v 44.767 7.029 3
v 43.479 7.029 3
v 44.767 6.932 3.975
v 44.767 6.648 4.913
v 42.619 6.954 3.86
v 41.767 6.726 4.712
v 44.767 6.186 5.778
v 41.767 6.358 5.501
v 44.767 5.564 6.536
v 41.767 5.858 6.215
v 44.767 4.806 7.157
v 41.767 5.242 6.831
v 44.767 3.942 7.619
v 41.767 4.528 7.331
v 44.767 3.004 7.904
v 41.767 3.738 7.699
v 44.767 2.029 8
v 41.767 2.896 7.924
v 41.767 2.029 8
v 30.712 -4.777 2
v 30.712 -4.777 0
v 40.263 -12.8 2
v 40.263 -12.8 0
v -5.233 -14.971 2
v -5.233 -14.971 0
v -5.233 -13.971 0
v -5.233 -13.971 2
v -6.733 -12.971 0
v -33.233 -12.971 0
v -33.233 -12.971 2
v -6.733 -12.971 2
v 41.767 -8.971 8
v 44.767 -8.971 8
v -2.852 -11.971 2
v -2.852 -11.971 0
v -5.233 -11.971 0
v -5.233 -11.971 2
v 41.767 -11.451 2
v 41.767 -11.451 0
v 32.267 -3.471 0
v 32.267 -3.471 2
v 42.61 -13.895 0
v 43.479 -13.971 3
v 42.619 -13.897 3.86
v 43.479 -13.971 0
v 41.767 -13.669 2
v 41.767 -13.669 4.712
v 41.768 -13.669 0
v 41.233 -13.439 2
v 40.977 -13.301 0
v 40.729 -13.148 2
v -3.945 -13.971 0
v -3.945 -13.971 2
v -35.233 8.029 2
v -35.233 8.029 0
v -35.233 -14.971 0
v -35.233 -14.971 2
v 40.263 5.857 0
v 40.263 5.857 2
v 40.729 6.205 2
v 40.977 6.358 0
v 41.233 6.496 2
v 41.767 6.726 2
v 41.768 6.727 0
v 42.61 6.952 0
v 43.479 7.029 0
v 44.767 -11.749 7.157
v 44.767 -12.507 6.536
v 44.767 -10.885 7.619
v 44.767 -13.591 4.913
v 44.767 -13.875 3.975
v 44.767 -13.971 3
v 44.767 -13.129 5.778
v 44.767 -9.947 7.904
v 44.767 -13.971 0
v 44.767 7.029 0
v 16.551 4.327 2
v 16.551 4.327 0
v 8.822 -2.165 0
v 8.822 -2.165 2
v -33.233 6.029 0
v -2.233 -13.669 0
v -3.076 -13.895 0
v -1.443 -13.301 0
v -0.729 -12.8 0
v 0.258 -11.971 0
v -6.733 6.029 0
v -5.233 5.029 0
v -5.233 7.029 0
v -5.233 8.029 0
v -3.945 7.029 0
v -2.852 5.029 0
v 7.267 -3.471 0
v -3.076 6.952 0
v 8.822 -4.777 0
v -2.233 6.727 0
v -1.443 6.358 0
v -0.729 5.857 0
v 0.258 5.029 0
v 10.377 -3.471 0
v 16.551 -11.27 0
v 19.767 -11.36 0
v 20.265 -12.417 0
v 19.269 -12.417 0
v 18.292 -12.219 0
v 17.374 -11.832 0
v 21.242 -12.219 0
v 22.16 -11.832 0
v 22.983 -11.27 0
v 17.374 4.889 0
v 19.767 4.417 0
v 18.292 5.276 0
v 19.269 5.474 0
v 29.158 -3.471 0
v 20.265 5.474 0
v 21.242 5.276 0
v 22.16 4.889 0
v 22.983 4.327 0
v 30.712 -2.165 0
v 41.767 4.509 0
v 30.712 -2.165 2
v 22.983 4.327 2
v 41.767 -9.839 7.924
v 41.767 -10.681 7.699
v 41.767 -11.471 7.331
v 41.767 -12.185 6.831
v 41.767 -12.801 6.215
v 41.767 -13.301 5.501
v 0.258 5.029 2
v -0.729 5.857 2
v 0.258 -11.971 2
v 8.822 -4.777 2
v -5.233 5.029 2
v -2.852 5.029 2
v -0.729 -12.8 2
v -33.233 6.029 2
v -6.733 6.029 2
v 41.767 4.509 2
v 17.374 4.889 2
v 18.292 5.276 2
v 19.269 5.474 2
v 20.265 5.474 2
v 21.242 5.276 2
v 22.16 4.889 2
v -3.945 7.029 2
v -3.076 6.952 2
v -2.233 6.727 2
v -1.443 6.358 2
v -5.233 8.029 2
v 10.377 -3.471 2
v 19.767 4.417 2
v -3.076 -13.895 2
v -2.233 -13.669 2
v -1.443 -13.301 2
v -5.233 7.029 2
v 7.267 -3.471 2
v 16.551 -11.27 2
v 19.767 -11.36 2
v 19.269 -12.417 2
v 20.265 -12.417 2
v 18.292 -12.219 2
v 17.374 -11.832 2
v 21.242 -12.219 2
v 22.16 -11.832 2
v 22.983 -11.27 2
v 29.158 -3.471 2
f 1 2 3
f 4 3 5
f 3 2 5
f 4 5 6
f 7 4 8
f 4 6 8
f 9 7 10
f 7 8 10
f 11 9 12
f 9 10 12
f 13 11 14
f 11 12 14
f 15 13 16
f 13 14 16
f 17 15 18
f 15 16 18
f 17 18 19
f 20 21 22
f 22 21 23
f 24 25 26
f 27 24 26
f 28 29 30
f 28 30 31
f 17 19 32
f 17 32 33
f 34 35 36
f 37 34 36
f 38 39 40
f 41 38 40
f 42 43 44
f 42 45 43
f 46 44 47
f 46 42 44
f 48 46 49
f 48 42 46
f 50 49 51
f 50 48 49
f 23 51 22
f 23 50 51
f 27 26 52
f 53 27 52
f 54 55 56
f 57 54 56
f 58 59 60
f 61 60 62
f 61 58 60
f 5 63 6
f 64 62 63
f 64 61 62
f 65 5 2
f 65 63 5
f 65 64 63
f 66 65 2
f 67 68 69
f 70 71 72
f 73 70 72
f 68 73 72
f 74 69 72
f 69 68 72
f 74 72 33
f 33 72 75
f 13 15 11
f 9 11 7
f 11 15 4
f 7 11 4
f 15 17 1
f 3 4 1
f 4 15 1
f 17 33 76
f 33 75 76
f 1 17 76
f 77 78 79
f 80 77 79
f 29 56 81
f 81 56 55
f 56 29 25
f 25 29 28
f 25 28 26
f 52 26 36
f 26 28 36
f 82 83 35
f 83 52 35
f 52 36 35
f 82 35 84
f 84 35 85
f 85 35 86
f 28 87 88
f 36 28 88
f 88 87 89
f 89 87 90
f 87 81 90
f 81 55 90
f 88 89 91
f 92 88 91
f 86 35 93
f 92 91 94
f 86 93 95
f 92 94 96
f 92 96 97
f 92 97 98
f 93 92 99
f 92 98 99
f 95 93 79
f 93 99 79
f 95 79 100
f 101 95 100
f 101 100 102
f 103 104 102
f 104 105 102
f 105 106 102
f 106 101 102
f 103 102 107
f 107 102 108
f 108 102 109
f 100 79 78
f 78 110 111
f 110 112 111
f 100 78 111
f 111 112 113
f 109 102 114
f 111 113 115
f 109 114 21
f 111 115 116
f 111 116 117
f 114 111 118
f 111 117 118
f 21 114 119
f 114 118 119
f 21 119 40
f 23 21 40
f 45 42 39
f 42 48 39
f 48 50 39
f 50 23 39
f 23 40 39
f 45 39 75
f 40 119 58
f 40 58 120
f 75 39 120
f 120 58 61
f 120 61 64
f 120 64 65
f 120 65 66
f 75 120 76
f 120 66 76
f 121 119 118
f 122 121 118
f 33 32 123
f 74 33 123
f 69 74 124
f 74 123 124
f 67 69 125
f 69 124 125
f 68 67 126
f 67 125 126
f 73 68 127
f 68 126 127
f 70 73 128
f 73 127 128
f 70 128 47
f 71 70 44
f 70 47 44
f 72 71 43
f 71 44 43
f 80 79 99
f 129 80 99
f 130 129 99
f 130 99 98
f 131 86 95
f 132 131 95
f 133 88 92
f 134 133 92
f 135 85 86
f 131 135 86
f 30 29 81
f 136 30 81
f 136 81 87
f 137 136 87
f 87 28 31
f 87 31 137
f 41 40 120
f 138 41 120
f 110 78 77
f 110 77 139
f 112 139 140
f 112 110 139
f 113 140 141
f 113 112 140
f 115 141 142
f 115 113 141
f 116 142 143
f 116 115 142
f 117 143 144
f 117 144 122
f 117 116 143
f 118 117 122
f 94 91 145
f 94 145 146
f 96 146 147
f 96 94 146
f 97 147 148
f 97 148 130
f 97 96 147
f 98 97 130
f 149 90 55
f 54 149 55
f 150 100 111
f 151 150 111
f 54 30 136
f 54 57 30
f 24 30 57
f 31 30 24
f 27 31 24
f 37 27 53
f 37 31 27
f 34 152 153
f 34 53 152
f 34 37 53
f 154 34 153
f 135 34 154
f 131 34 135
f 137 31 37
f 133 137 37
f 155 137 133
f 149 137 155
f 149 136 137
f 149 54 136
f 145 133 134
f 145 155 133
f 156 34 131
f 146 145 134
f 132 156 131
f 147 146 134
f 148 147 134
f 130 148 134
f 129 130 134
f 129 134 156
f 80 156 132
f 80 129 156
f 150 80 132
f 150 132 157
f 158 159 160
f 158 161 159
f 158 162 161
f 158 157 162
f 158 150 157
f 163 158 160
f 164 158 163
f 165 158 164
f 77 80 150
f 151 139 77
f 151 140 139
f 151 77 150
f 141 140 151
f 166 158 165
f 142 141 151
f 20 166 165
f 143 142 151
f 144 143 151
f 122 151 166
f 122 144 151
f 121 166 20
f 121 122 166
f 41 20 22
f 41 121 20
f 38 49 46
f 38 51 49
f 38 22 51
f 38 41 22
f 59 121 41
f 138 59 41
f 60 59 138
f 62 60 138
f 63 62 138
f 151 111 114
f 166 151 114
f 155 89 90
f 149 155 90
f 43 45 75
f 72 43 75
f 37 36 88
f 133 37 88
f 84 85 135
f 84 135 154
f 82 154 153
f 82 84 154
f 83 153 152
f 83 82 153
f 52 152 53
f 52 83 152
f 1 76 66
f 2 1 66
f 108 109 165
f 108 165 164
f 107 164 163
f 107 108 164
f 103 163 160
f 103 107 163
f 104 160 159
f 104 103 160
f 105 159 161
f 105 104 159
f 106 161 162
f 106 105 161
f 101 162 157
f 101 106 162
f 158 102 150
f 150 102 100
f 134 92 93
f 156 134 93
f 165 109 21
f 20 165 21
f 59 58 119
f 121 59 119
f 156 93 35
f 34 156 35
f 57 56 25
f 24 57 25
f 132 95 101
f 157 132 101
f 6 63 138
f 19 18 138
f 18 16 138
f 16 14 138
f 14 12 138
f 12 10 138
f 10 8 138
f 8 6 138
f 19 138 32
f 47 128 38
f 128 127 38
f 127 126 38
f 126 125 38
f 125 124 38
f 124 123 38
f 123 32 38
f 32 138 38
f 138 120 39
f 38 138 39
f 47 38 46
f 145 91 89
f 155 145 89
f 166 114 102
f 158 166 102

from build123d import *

# Parameters (mm, degrees)
F0_W        = 26.5
F0_H        = 19
F1_DEPTH    = 2
F2_DEPTH    = 8
F3_T1_DEPTH = 23
F3_T3_DEPTH = 11.1067326603
F3_T5_DEPTH = 28


# Not quite as in the source:
# - a fillet or chamfer that OpenCascade refuses, or shapes differently, is made with other operations: its cross-section is extruded or revolved along the edge and cut away or added


with BuildPart() as f1:
    # F0 (on Top) → F1 (new body)
    with BuildSketch(Plane.XY):
        Polygon((-5.2328903973, 8.0285165012), (-35.2328903973, 8.0285165012), (-35.2328903973, -14.9714834988), (-5.2328903973, -14.9714834988), (-5.2328903973, -13.9714834988), (-5.2328903973, -11.9714834988), (-5.2328903973, 5.0285165012), (-5.2328903973, 7.0285165012), align=None)
        with Locations((-19.9828903973, -3.4714834988)):
            Rectangle(F0_W, F0_H, mode=Mode.SUBTRACT)
        Polygon((-2.8519380164, 5.0285165012), (-5.2328903973, 7.0285165012), (-5.2328903973, 5.0285165012), align=None)
        Polygon((-2.1233994035, 7.0285165012), (-5.2328903973, 7.0285165012), (-2.8519380164, 5.0285165012), (0.2575529774, 5.0285165012), align=None)
        Polygon((0.2575529774, 5.0285165012), (-2.8519380164, 5.0285165012), (7.2671096027, -3.4714834988), (8.8218550996, -2.1654972814), align=None)
        Polygon((-5.2328903973, -11.9714834988), (-5.2328903973, -13.9714834988), (-2.8519380164, -11.9714834988), align=None)
        Polygon((-2.8519380164, -11.9714834988), (-5.2328903973, -13.9714834988), (-2.1233994035, -13.9714834988), (0.2575529774, -11.9714834988), align=None)
        Polygon((8.8218550996, -4.7774697162), (7.2671096027, -3.4714834988), (-2.8519380164, -11.9714834988), (0.2575529774, -11.9714834988), align=None)
        Polygon((8.8218550996, -2.1654972814), (7.2671096027, -3.4714834988), (8.8218550996, -4.7774697162), (10.3766005965, -3.4714834988), align=None)
        Polygon((21.3218550996, 5.7225302838), (19.7671096027, 7.0285165012), (8.8218550996, -2.1654972814), (10.3766005965, -3.4714834988), (19.7671096027, 4.4165440664), align=None)
        Polygon((10.3766005965, -3.4714834988), (8.8218550996, -4.7774697162), (19.7671096027, -13.9714834988), (21.3218550996, -12.6654972814), (19.7671096027, -11.359511064), align=None)
        Polygon((19.7671096027, -11.359511064), (21.3218550996, -12.6654972814), (30.7123641058, -4.7774697162), (29.1576186089, -3.4714834988), align=None)
        Polygon((30.7123641058, -2.1654972814), (21.3218550996, 5.7225302838), (19.7671096027, 4.4165440664), (29.1576186089, -3.4714834988), align=None)
        Polygon((32.2671096027, -3.4714834988), (30.7123641058, -2.1654972814), (29.1576186089, -3.4714834988), (30.7123641058, -4.7774697162), align=None)
        Polygon((41.7671096027, 7.0285165012), (41.6576186089, 7.0285165012), (30.7123641058, -2.1654972814), (32.2671096027, -3.4714834988), (41.7671096027, 4.5085165012), align=None)
        Polygon((30.7123641058, -4.7774697162), (41.6576186089, -13.9714834988), (41.7671096027, -13.9714834988), (41.7671096027, -11.4514834988), (32.2671096027, -3.4714834988), align=None)
    extrude(amount=F1_DEPTH)

    # F0 (on Top) → F2 (join)
    with BuildSketch(Plane.XY):
        Polygon((44.7671096027, 7.0285165012), (41.7671096027, 7.0285165012), (41.7671096027, 4.5085165012), align=None)
        Polygon((44.7671096027, 7.0285165012), (41.7671096027, 4.5085165012), (41.7671096027, -11.4514834988), (44.7671096027, -13.9714834988), align=None)
        Polygon((41.7671096027, -11.4514834988), (41.7671096027, -13.9714834988), (44.7671096027, -13.9714834988), align=None)
    extrude(amount=F2_DEPTH)

    # F3: fillet of radius 5 on 8 edges, made by hand

    # F3_s2 → F3_t1 (cut)
    with BuildSketch(Plane.XY.offset(-10.5)):
        with BuildLine():
            ThreePointArc((22.9830700348, -11.2700767358), (19.7671096027, -12.4415524119), (16.5511491706, -11.2700767358))
            Line((16.5511491706, -11.2700767358), (19.7671096027, -13.9714834988))
            Line((19.7671096027, -13.9714834988), (22.9830700348, -11.2700767358))
        make_face()
        with BuildLine():
            ThreePointArc((16.5511491706, 4.3271097382), (19.7671096027, 5.4985854143), (22.9830700348, 4.3271097382))
            Line((22.9830700348, 4.3271097382), (19.7671096027, 7.0285165012))
            Line((19.7671096027, 7.0285165012), (16.5511491706, 4.3271097382))
        make_face()
    extrude(amount=F3_T1_DEPTH, mode=Mode.SUBTRACT)

    # F3_s4 → F3_t3 (cut)
    with BuildSketch(Plane.XY.offset(-4.5533663301)):
        with BuildLine():
            ThreePointArc((-0.7287855035, -12.8000078228), (-2.2334045932, -13.6694948664), (-3.9447459356, -13.9714834988))
            Line((-3.9447459356, -13.9714834988), (-2.1233994035, -13.9714834988))
            Line((-2.1233994035, -13.9714834988), (-0.7287855035, -12.8000078228))
        make_face()
        with BuildLine():
            ThreePointArc((-3.9447459356, 7.0285165012), (-2.2334045932, 6.7265278688), (-0.7287855035, 5.8570408251))
            Line((-0.7287855035, 5.8570408251), (-2.1233994035, 7.0285165012))
            Line((-2.1233994035, 7.0285165012), (-3.9447459356, 7.0285165012))
        make_face()
        with BuildLine():
            ThreePointArc((40.2630047089, 5.8570408251), (41.7676237986, 6.7265278688), (43.478965141, 7.0285165012))
            Line((43.478965141, 7.0285165012), (41.6576186089, 7.0285165012))
            Line((41.6576186089, 7.0285165012), (40.2630047089, 5.8570408251))
        make_face()
        with BuildLine():
            ThreePointArc((43.478965141, -13.9714834988), (41.7676237986, -13.6694948664), (40.2630047089, -12.8000078228))
            Line((40.2630047089, -12.8000078228), (41.6576186089, -13.9714834988))
            Line((41.6576186089, -13.9714834988), (43.478965141, -13.9714834988))
        make_face()
    extrude(amount=F3_T3_DEPTH, mode=Mode.SUBTRACT)

    # F3_s6 → F3_t5 (cut)
    with BuildSketch(Plane.YZ.offset(29.2671096027)):
        with BuildLine():
            ThreePointArc((-8.9714834988, 8), (-12.5070174047, 6.5355339059), (-13.9714834988, 3))
            Line((-13.9714834988, 3), (-13.9714834988, 8))
            Line((-13.9714834988, 8), (-8.9714834988, 8))
        make_face()
        with BuildLine():
            ThreePointArc((7.0285165012, 3), (5.5640504071, 6.5355339059), (2.0285165012, 8))
            Line((2.0285165012, 8), (7.0285165012, 8))
            Line((7.0285165012, 8), (7.0285165012, 3))
        make_face()
    extrude(amount=F3_T5_DEPTH, mode=Mode.SUBTRACT)


solid = f1.part
